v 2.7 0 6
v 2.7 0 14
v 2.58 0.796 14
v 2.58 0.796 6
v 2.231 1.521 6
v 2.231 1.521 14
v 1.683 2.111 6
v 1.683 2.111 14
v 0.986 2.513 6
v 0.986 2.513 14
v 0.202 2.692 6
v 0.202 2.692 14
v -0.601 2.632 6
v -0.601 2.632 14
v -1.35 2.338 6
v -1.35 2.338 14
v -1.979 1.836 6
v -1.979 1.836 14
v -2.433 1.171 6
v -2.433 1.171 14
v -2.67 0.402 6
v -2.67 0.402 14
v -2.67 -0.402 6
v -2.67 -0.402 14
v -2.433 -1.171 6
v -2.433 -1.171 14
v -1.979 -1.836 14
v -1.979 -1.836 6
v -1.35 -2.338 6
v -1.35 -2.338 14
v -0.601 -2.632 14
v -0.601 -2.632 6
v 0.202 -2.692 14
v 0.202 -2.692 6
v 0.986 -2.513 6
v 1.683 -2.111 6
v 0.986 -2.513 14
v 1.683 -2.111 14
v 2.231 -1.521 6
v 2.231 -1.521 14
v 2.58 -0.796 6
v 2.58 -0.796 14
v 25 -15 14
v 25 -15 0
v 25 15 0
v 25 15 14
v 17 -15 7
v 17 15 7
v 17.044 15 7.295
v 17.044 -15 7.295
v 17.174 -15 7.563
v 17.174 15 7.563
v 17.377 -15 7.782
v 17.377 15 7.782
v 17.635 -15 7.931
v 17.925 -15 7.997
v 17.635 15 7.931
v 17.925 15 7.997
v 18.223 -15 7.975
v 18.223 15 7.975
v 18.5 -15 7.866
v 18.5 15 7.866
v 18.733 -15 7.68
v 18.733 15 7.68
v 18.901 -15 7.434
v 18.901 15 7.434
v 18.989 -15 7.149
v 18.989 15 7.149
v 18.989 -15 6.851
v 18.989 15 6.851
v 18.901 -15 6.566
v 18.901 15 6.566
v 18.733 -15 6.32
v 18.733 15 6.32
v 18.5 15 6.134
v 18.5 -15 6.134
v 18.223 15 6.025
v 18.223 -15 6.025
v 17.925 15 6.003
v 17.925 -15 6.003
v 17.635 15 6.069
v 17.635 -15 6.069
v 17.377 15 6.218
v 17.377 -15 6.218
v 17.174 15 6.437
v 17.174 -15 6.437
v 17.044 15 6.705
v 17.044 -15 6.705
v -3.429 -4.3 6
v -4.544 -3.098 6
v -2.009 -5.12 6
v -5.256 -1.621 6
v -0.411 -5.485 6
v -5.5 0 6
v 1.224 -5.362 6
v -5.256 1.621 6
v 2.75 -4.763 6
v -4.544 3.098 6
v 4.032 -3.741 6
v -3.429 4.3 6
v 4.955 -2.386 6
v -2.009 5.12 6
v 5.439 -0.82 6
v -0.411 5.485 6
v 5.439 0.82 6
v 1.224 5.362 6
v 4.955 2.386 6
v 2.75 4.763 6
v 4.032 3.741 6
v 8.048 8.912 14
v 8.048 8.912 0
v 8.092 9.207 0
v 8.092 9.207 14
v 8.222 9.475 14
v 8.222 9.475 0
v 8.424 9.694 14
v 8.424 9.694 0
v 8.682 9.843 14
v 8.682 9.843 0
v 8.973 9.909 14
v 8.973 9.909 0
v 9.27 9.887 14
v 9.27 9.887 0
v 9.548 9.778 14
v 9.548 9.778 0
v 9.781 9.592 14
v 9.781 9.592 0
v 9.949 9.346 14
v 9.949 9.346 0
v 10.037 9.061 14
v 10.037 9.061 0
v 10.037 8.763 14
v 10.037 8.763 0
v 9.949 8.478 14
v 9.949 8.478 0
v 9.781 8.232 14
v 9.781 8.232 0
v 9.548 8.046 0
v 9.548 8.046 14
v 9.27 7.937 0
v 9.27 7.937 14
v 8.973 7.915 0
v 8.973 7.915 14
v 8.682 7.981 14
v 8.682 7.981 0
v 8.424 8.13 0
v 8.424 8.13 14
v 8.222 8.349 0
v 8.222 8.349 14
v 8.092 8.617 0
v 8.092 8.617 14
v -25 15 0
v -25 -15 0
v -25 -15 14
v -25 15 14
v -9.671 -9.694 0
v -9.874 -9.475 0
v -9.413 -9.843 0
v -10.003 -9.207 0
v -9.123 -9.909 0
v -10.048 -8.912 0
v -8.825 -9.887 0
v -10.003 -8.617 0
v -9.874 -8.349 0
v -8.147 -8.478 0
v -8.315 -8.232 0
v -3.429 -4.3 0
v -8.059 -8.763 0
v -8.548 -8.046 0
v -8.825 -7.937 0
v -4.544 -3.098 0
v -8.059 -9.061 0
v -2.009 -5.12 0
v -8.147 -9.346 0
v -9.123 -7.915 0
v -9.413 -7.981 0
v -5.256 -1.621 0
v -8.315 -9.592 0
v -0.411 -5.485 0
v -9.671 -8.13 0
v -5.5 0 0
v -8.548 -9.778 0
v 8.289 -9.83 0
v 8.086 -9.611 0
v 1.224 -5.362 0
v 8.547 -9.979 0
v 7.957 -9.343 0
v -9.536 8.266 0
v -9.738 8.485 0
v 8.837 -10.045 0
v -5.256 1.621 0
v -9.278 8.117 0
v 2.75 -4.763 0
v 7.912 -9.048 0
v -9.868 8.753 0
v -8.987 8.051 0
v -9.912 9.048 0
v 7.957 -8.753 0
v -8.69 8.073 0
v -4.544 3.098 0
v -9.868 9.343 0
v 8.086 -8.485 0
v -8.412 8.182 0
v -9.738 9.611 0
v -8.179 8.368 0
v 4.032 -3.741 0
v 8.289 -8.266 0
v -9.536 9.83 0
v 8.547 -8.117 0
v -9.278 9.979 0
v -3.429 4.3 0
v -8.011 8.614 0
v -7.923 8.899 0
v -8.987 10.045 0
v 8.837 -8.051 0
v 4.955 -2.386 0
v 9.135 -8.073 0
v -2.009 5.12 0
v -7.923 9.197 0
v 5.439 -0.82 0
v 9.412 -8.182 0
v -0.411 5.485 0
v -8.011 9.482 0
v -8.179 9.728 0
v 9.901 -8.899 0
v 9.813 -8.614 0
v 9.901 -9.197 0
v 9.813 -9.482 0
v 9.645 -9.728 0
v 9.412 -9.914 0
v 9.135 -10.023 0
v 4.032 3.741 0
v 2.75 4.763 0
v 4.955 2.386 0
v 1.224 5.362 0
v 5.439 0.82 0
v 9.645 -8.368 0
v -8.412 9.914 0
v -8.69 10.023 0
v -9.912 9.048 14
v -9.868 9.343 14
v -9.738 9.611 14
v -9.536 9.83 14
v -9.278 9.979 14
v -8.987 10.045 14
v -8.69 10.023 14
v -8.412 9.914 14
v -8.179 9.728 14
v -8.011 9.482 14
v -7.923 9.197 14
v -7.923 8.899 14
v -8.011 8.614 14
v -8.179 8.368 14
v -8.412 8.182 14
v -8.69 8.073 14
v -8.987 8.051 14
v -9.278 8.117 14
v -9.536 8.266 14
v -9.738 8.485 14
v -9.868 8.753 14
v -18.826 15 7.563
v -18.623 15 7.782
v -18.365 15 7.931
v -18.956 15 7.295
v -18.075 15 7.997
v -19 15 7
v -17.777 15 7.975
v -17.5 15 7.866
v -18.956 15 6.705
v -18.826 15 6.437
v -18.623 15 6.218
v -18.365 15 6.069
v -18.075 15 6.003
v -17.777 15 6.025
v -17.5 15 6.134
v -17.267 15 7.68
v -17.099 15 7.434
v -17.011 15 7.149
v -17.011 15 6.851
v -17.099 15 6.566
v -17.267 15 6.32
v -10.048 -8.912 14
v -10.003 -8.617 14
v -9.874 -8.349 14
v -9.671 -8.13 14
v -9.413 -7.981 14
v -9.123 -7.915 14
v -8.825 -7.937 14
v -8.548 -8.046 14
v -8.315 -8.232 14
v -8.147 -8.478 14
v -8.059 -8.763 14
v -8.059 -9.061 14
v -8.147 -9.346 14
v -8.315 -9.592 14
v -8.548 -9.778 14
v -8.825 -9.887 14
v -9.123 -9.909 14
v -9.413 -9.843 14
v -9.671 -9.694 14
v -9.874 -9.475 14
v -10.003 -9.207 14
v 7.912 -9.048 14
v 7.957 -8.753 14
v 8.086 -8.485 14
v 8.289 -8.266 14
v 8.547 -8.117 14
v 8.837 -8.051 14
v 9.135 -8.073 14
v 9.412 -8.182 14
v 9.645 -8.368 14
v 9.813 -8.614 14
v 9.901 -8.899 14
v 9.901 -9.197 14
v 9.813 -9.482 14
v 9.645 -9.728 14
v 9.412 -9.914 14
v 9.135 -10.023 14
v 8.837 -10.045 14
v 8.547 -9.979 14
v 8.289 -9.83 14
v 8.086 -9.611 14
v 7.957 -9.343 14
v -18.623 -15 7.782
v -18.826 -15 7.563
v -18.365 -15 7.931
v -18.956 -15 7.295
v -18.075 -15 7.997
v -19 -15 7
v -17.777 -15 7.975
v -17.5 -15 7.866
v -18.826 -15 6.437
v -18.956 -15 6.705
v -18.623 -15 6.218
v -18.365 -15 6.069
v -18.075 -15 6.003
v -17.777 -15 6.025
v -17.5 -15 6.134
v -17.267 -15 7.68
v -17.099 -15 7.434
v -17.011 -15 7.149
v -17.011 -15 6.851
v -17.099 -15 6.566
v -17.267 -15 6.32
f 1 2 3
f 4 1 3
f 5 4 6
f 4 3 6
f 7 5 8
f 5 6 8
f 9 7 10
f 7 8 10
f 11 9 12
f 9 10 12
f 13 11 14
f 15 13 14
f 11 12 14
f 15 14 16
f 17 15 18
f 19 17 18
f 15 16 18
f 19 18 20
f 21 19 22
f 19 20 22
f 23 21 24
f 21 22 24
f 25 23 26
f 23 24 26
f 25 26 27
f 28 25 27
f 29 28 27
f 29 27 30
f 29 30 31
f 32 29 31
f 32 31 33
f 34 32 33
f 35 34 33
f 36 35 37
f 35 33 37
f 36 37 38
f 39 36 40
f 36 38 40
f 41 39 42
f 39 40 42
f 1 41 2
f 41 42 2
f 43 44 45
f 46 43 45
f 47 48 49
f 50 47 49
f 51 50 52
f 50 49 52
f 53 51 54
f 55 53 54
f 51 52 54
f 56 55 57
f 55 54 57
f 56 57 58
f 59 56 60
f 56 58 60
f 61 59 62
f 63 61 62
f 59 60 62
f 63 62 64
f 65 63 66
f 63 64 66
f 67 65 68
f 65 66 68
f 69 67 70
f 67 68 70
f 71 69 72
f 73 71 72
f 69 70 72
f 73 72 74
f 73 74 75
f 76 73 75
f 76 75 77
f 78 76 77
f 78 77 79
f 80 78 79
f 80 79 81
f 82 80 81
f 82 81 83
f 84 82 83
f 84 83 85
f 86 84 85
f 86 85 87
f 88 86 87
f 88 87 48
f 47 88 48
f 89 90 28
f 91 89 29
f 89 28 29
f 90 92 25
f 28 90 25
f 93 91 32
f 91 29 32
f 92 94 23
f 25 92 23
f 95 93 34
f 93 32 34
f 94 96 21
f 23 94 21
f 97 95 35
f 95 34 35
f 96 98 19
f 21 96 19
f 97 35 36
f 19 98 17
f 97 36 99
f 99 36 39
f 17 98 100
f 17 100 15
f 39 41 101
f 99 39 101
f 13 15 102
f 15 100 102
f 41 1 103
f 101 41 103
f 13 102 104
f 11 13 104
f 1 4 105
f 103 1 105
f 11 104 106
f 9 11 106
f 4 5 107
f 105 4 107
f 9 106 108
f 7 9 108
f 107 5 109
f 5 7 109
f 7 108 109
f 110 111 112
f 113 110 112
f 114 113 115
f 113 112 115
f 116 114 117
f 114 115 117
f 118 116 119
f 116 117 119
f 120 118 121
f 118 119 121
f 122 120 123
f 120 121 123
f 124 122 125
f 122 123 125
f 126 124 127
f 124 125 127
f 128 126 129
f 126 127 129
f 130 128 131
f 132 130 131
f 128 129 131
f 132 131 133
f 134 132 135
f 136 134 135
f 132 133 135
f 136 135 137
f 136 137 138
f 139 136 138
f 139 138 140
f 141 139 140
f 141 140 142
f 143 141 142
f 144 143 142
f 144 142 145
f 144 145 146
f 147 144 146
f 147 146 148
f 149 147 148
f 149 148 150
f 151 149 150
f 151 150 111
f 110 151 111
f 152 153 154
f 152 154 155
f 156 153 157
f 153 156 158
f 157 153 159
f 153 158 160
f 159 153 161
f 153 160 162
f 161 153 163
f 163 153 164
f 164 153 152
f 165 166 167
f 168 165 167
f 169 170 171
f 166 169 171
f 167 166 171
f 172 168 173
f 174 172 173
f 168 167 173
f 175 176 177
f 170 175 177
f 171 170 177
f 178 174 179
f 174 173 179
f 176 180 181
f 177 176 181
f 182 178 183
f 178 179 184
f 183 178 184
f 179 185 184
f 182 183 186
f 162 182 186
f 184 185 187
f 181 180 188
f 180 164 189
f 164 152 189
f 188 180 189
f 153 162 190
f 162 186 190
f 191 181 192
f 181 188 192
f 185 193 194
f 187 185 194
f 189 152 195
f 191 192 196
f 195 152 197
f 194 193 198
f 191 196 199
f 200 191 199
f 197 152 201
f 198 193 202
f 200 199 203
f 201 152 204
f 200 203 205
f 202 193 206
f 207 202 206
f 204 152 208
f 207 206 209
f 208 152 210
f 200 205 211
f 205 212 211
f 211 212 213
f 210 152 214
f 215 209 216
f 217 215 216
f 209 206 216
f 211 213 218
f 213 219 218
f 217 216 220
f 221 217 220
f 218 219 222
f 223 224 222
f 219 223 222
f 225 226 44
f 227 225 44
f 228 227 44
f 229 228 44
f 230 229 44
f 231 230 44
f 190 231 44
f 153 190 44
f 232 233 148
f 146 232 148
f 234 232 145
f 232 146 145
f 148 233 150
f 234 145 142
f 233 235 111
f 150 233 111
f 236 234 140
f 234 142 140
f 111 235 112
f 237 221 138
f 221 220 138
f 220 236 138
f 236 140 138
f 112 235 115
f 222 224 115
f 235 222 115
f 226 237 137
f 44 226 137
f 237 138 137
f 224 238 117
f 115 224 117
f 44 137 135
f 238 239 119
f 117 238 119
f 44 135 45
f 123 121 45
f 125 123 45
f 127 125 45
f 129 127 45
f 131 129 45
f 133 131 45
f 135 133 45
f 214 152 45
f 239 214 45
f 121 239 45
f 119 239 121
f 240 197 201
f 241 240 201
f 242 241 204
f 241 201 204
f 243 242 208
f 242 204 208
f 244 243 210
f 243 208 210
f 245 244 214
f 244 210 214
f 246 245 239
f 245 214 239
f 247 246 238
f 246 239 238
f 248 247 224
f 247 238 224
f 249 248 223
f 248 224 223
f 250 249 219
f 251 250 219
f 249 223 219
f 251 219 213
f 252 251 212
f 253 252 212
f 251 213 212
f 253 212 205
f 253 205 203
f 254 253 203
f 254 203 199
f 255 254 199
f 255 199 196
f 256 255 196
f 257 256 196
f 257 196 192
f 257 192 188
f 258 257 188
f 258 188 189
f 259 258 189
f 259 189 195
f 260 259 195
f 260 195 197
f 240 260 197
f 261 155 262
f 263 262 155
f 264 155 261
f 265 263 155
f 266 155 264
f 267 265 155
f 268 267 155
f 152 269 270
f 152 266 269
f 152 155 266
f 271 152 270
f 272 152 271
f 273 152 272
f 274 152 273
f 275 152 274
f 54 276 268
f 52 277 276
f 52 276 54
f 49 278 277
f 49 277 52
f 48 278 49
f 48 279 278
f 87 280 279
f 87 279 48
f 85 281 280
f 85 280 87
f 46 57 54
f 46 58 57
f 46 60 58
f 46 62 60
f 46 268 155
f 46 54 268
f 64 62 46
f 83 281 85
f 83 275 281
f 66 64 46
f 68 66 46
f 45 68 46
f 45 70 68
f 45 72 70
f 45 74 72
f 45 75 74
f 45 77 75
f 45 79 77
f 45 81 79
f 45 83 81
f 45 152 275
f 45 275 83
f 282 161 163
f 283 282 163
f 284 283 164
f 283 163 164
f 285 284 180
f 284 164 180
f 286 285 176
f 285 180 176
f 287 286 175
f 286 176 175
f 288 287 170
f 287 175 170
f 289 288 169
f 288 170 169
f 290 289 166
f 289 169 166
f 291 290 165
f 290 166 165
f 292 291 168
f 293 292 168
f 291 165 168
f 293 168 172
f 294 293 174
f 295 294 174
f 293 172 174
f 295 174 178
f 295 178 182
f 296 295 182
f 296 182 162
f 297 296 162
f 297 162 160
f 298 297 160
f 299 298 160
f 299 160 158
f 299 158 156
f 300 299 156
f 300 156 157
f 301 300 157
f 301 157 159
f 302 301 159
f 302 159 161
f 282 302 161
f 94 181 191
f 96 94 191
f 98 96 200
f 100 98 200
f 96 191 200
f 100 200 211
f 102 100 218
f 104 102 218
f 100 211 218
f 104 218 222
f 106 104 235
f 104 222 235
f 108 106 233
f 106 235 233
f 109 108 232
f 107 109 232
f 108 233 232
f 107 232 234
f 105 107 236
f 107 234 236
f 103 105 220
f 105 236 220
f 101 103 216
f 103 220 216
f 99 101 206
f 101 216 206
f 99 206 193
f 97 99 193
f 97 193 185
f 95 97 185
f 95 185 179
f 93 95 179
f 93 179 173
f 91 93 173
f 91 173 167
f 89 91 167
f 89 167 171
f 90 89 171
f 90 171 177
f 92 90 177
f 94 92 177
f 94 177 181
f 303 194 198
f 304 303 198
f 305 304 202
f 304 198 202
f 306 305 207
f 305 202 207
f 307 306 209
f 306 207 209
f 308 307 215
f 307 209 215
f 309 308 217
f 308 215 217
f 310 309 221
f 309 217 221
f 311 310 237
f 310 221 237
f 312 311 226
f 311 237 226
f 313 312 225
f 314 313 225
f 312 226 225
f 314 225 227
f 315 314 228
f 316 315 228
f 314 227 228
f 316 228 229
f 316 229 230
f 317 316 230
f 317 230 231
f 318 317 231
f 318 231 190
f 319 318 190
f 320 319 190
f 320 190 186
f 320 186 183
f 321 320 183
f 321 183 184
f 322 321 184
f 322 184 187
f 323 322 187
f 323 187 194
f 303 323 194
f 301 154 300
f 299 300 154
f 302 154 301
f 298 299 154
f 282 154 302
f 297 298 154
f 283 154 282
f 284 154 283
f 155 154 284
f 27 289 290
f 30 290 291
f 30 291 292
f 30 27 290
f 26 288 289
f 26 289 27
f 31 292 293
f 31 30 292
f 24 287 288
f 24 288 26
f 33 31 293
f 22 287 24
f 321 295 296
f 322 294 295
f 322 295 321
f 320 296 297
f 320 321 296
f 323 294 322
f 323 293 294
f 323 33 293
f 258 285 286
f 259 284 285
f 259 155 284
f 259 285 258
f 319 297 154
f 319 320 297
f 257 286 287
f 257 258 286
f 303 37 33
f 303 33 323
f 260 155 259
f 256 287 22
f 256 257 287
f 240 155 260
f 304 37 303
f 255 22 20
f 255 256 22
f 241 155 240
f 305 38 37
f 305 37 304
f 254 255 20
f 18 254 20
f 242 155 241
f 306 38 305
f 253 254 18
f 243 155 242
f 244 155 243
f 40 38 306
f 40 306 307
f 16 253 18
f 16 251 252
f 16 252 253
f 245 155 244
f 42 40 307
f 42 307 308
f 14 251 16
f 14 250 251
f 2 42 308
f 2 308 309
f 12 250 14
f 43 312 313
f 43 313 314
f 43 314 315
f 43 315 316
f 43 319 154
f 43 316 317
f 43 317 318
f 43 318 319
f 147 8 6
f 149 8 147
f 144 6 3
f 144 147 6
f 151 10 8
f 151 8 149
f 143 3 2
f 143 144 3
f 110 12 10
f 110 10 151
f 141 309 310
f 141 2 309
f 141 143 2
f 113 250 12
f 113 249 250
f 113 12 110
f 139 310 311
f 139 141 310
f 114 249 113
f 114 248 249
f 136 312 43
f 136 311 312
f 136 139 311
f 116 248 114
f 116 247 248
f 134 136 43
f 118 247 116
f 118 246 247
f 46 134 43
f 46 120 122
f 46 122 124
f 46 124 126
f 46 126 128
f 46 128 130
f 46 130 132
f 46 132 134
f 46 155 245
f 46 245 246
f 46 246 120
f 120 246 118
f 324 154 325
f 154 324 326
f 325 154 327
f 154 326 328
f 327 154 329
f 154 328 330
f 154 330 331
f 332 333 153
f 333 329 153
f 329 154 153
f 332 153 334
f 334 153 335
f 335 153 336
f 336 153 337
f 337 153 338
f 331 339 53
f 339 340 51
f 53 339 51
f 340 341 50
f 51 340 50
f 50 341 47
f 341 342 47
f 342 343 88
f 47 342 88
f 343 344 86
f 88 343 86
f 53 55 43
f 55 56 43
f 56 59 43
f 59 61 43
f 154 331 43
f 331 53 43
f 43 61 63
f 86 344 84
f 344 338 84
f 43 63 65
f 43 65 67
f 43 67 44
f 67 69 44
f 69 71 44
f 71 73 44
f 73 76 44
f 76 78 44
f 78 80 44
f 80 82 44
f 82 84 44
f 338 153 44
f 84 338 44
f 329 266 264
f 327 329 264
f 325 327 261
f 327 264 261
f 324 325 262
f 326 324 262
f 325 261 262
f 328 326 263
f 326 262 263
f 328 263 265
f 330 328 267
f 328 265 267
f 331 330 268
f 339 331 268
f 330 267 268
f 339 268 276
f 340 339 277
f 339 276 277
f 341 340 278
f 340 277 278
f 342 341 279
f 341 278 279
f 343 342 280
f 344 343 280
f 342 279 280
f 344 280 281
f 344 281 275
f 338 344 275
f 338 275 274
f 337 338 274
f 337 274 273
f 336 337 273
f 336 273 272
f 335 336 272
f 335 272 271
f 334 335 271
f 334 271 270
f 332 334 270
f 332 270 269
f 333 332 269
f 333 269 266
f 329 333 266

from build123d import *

# Parameters (mm, degrees)
F0_W     = 50
F0_H     = 30
F1_DEPTH = 14
F3_D     = 11
F5_D     = 2
F7_D     = 2
F8_R     = 5.5
F8_R_2   = 2.7
F9_DEPTH = 8


# Not quite as in the source:
# - a feature names something its author has since deleted; it is built from what else it names


with BuildPart() as f1:
    # F0 (on Top) → F1 (new body)
    with BuildSketch(Plane.XY):
        Rectangle(F0_W, F0_H)
    extrude(amount=F1_DEPTH)

    # F3 (through all)
    with Locations(Plane.XY.offset(14)):
        with Locations((0, 0)):
            Hole(F3_D / 2)

    # F5 (through all)
    with Locations(Plane.XY.offset(14)):
        with Locations((-8.9121767002, 9.0478232998), (9.0478232998, 8.9121767002), (8.9121767002, -9.0478232998), (-9.0478232998, -8.9121767002)):
            Hole(F5_D / 2)

    # F7 (through all)
    with Locations(Plane.XZ.offset(15)):
        with Locations((18, 7), (-18, 7)):
            Hole(F7_D / 2)

    # F8 (on face) → F9 (join)
    with BuildSketch(Plane.XY.offset(14)):
        Circle(F8_R)
        Circle(F8_R_2, mode=Mode.SUBTRACT)
    extrude(amount=-F9_DEPTH)


solid = f1.part
